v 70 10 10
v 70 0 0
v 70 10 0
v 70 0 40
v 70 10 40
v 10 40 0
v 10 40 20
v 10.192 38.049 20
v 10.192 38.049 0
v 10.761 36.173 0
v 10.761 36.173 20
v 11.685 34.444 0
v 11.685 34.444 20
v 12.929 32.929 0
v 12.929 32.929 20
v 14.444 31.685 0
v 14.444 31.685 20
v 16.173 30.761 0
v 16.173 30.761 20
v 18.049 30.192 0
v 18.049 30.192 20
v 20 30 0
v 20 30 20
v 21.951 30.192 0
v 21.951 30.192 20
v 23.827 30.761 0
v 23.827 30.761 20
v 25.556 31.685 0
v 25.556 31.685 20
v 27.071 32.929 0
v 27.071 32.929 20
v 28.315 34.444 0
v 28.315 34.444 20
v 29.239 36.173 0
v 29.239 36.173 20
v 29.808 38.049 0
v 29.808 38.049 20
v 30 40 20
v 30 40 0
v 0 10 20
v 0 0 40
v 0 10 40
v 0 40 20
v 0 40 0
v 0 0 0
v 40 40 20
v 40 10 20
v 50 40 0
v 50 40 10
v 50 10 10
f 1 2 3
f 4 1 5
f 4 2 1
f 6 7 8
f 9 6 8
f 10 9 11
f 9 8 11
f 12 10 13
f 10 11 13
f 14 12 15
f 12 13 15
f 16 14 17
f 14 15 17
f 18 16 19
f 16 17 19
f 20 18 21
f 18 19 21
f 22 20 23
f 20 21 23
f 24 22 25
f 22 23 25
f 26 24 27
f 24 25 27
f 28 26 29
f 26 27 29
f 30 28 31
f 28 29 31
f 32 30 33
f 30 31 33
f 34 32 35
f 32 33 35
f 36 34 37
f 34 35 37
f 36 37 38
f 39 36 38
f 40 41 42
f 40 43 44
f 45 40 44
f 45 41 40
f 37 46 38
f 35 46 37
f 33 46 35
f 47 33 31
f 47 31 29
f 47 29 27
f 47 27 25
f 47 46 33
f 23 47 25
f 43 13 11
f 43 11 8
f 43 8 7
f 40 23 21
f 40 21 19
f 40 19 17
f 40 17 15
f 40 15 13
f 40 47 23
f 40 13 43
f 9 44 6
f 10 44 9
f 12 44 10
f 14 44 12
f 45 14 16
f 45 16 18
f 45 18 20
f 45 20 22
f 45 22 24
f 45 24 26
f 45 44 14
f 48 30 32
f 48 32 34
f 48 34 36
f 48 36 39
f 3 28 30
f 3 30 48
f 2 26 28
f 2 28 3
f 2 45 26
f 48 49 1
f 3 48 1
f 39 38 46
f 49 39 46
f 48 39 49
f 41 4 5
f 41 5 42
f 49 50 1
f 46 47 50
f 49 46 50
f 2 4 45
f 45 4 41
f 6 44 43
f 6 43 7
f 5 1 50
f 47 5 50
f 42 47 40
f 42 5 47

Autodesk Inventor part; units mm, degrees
ref_plane "YZ Plane" through (0, 0, 0) normal (1, 0, 0) x (0, 1, 0)
ref_plane "XZ Plane" through (0, 0, 0) normal (0, 1, 0) x (-1, 0, 0)
ref_plane "XY Plane" through (0, 0, 0) normal (0, 0, 1) x (1, 0, 0)
sketch "草圖1" plane through (0, 0, 0) normal (0, 1, 0) x (-1, 0, 0)
  line L0 (0, 0) -> (-70, 0)
  line L1 (-70, 0) -> (-70, 40)
  line L2 (-70, 40) -> (0, 40)
  line L3 (0, 40) -> (0, 0)
  dimension "d0" = 70
  dimension "d1" = 40
extrude "擠出1" add sketch "草圖1" along normal blind 10
sketch "草圖2" plane through (0, 10, 0) normal (0, 1, 0) x (1, 0, 0)
  line L0 (0, -40) -> (0, 0) projected
  line L1 (0, 0) -> (70, 0) projected
  line L2 (70, 0) -> (70, -40) projected
  line L3 (70, -40) -> (0, -40) projected
  line L4 (0, 0) -> (70, 0)
  line L5 (70, 0) -> (70, -20)
  line L6 (70, -20) -> (0, -20)
  line L7 (0, -20) -> (0, 0)
  line L8 (70, -40) -> (70, 0) projected
  line L9 (40, -20) -> (50, -10)
  line L10 (50, -10) -> (70, -10)
  point P0 (0, -20)
  dimension "d4" = 20
  dimension "d5" = 10
  dimension "d6" = 20
  dimension "d7" = 30
extrude "擠出2" add sketch "草圖2" along normal blind 30 contours L0 L1 L2 L10 L9 L6
sketch "草圖3" plane through (50, 10, 10) normal (0, 0, 1) x (1, 0, 0)
  line L0 (0, 30) -> (0, 0) projected
  line L1 (0, 0) -> (20, 0) projected
  line L2 (20, 0) -> (20, -10) projected
  line L3 (20, -10) -> (-50, -10) projected
  line L4 (-50, -10) -> (-50, 30) projected
  line L5 (-50, 30) -> (0, 30) projected
  line L6 (0, 30) -> (20, 30) projected
  line L7 (20, 30) -> (20, 0) projected
  line L8 (0, 30) -> (20, 30) projected
  line L9 (20, 0) -> (0, 0) projected
  line L10 (0, 30) -> (20, 0)
extrude "擠出3" cut sketch "草圖3" against normal blind 10 contours L6 L7 L10
sketch "草圖4" plane through (0, 10, 20) normal (0, 0, 1) x (1, 0, 0)
  line L0 (0, -10) -> (0, 0) projected
  line L1 (0, 0) -> (0, 30) projected
  line L2 (0, 30) -> (40, 30) projected
  line L3 (40, 30) -> (40, 0) projected
  line L4 (40, 0) -> (70, 0) projected
  line L5 (70, 0) -> (70, -10) projected
  line L6 (70, -10) -> (0, -10) projected
  line L7 (0, 0) -> (40, 0) projected
  line L8 (0, 30) -> (40, 30) projected
  circle A0 centre (20, 30) radius 10
  dimension "d12" = 20
extrude "擠出4" cut sketch "草圖4" against normal blind 46 contours A0 L2 | L2 A0
properties part number "28" material "鋼、碳鋼"
